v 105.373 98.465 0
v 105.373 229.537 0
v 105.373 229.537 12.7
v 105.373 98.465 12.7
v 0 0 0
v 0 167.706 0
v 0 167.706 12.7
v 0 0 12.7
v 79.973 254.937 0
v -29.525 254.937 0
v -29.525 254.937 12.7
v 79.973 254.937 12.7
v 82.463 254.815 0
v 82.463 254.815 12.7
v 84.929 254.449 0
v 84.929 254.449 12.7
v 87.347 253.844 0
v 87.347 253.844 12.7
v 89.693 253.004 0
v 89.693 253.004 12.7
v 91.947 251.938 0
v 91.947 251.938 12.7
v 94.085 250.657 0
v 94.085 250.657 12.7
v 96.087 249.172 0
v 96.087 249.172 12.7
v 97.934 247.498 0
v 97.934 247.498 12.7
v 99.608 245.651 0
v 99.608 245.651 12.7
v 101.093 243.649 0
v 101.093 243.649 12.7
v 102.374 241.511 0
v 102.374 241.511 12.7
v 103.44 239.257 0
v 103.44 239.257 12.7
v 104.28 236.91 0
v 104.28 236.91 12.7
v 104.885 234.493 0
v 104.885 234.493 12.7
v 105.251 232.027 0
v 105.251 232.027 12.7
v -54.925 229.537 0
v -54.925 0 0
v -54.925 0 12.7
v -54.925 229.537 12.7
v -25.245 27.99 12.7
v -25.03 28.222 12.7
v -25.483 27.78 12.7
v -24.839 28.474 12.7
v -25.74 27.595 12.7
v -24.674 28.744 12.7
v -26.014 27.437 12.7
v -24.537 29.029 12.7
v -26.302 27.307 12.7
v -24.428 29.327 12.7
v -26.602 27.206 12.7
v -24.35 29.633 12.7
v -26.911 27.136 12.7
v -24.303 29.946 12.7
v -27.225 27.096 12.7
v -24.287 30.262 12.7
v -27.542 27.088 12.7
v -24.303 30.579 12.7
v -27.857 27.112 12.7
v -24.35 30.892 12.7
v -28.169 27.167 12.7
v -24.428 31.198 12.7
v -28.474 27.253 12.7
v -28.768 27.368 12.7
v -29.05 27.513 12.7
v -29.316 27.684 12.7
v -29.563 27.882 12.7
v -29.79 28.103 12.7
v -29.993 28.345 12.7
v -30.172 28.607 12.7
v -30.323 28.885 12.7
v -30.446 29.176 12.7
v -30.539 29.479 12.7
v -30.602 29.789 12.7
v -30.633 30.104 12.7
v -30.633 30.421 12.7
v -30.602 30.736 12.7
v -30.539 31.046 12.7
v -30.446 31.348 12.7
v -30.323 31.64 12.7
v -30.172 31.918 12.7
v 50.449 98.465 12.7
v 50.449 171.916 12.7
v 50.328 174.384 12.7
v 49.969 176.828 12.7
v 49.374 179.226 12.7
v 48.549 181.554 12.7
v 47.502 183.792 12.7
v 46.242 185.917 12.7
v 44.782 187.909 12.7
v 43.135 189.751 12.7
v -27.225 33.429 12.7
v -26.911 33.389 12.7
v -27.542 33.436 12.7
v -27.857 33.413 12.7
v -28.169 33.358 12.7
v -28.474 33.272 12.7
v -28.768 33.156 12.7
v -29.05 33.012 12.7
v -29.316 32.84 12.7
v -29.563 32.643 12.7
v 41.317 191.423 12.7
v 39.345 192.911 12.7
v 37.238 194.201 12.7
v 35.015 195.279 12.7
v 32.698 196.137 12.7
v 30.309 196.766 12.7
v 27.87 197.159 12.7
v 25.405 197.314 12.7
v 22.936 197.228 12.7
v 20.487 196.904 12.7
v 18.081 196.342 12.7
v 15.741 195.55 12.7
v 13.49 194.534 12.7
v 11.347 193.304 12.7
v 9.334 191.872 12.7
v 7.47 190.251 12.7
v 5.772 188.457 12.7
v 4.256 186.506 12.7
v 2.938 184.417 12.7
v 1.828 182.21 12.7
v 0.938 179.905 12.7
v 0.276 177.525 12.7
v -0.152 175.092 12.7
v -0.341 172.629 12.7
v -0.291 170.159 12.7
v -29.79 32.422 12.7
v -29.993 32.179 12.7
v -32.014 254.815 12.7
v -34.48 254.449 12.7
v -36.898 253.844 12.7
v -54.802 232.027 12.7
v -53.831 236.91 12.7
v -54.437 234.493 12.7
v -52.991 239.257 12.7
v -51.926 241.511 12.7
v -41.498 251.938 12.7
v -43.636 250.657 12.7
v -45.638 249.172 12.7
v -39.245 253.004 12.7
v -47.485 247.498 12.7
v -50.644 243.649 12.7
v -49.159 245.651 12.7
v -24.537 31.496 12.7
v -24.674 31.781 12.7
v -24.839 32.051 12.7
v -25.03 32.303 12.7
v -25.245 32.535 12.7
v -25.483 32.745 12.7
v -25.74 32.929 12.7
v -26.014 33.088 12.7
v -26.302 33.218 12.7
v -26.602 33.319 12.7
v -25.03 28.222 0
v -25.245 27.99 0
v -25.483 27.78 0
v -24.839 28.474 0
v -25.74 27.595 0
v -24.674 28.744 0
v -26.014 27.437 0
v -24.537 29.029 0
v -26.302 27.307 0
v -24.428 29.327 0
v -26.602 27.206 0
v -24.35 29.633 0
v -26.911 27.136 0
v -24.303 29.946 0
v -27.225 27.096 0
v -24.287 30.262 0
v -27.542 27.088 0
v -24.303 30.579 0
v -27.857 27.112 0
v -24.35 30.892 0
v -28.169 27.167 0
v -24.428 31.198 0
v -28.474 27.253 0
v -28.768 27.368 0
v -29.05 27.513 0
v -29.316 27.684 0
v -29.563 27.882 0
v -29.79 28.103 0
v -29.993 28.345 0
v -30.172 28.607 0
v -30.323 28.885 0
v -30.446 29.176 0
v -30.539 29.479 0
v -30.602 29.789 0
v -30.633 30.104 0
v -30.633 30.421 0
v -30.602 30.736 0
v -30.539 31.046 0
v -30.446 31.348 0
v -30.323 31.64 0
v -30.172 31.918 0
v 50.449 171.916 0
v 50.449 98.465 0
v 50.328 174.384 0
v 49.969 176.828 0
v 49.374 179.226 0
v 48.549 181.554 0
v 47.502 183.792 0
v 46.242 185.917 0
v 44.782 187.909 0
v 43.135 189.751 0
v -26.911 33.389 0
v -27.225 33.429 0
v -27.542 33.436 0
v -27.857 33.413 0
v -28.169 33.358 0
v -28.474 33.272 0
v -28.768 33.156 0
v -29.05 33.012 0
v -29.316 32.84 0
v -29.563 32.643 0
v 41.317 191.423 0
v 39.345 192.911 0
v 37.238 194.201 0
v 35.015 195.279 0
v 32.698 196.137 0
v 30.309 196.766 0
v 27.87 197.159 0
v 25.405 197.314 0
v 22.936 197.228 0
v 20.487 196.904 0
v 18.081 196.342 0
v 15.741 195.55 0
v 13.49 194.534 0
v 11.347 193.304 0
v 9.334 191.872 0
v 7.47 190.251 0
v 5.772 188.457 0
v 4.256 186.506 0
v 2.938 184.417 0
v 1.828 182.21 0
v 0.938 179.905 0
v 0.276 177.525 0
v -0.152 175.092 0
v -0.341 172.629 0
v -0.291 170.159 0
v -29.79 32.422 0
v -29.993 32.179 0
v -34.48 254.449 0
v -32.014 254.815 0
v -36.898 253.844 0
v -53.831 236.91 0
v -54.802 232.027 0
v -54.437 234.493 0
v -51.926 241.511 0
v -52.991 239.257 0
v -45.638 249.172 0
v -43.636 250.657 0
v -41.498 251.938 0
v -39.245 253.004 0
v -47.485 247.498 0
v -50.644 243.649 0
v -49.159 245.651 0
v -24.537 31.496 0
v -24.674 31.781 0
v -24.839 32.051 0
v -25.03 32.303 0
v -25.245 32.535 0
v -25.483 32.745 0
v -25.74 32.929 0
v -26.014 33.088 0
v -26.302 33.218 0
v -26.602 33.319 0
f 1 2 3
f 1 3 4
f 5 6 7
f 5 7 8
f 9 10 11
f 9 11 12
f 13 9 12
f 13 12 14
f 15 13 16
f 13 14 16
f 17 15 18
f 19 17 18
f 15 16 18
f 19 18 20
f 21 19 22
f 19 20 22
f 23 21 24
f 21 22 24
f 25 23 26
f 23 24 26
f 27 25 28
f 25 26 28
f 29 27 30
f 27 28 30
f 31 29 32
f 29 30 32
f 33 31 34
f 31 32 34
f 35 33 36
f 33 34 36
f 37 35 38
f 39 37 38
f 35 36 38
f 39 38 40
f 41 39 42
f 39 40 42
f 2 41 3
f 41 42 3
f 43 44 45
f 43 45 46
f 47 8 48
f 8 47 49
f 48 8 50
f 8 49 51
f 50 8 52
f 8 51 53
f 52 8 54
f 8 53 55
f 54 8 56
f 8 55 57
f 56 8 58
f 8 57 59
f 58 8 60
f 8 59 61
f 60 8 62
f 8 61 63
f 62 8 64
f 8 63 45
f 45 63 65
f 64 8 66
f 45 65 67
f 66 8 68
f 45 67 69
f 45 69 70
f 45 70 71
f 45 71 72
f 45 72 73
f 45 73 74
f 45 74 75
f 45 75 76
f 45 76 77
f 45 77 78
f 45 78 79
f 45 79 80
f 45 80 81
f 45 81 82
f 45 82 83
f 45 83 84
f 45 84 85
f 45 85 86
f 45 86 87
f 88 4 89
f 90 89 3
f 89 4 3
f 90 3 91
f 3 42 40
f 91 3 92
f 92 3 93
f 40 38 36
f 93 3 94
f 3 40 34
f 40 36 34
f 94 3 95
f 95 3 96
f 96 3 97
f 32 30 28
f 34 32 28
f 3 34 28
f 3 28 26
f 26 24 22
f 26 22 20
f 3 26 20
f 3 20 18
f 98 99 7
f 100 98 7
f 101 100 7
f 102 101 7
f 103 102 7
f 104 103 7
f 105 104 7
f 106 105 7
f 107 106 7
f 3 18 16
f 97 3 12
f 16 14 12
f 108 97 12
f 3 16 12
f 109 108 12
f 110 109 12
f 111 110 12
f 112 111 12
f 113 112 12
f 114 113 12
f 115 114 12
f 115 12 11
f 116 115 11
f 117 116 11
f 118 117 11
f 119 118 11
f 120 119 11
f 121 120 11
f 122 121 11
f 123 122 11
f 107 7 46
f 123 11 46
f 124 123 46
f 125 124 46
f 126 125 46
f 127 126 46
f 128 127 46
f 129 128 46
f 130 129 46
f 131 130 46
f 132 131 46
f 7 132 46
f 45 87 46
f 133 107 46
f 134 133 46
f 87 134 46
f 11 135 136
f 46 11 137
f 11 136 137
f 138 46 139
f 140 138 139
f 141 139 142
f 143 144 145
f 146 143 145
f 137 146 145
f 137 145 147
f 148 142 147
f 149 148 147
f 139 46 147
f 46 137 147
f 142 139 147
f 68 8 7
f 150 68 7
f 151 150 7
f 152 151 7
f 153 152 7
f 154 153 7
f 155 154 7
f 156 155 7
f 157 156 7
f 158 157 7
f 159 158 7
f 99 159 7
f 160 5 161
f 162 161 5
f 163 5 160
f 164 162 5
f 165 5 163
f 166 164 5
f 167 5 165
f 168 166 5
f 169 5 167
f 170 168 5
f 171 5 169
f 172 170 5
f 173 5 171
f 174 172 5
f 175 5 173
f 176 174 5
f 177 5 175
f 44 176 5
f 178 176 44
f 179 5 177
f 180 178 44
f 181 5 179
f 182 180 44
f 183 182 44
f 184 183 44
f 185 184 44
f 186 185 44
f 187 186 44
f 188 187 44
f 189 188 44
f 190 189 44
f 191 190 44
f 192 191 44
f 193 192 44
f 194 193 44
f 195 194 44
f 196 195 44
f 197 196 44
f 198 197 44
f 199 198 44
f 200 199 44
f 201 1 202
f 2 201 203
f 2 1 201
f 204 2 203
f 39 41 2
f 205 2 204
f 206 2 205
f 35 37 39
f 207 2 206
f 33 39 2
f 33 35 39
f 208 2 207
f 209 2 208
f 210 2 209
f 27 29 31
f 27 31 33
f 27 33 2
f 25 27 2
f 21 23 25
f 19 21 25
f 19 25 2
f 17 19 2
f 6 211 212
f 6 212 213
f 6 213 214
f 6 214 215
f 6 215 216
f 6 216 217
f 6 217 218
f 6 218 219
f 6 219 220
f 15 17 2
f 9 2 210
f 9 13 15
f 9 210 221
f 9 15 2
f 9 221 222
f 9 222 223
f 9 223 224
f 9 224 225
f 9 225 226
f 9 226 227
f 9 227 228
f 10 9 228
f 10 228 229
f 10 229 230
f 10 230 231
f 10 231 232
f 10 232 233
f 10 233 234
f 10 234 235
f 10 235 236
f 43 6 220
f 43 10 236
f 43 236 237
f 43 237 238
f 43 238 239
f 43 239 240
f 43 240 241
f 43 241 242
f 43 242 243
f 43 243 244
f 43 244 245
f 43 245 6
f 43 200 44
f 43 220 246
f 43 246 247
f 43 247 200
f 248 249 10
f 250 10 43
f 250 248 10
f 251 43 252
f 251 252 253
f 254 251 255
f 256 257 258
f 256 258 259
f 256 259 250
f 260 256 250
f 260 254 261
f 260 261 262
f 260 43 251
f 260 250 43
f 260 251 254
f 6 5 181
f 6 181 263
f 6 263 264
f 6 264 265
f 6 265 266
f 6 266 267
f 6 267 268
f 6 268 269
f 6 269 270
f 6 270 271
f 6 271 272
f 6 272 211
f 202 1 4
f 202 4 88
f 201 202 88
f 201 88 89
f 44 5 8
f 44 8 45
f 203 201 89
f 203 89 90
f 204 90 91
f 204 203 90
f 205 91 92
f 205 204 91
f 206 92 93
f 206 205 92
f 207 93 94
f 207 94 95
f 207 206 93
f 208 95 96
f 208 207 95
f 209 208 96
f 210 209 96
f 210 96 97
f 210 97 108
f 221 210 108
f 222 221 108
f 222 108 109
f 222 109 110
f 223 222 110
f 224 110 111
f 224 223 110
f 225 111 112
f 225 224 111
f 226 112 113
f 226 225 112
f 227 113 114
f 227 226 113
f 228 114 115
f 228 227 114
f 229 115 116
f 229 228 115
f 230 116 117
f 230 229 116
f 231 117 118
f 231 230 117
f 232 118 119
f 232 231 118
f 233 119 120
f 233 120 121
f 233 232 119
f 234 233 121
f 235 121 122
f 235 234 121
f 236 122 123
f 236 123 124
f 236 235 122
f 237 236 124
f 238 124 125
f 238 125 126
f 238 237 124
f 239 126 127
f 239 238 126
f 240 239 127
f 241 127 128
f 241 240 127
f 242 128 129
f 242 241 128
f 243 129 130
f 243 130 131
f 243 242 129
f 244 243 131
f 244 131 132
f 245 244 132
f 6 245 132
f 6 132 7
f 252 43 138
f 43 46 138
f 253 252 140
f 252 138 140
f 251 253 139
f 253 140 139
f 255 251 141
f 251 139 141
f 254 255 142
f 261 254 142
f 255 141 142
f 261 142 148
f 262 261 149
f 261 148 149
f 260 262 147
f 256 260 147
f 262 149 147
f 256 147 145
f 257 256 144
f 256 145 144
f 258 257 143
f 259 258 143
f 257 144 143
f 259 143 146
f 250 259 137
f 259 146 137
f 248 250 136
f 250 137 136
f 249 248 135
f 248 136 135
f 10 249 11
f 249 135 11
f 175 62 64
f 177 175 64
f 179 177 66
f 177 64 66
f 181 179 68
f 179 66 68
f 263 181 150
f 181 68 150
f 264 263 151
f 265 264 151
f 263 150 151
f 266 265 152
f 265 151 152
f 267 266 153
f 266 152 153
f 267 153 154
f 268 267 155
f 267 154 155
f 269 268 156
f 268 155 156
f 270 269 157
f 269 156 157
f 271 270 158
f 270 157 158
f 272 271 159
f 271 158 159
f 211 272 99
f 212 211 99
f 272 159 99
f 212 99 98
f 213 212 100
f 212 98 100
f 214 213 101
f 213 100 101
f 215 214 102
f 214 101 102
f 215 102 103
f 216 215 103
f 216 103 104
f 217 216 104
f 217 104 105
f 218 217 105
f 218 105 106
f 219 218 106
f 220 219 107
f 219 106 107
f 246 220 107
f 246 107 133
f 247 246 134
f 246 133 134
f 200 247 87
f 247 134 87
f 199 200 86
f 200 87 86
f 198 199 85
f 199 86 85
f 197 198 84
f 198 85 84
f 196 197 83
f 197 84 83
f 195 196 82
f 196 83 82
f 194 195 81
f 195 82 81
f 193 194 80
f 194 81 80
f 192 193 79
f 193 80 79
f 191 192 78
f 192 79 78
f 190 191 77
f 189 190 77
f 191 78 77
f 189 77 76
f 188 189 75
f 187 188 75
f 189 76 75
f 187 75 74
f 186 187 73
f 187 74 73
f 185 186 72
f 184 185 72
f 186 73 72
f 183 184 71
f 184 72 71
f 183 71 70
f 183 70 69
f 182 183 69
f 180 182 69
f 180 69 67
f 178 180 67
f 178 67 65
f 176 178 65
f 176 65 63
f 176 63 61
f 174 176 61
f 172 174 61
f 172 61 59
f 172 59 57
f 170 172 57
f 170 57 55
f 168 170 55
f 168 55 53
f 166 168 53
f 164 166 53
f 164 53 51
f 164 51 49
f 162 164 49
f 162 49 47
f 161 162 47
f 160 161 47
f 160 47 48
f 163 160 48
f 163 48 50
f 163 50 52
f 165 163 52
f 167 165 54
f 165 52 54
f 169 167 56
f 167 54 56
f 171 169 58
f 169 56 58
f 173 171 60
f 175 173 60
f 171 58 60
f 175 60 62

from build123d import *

# Parameters (mm, degrees)
BOSS_EXTRUDE2_DEPTH = 12.7
FILLET1_R           = 25.4
FILLET2_R           = 25.4
SKETCH3_R           = 3.175
CUT_EXTRUDE3_DEPTH  = 12.7


with BuildPart() as part:
    # Sketch1 → Boss-Extrude2 (new body)
    with BuildSketch(Plane.XY):
        with BuildLine():
            Line((0, 167.705976621), (0, 0))
            Line((0, 0), (-54.924735551, 0))
            Line((-54.924735551, 0), (-54.924735551, 254.93724428))
            Line((-54.924735551, 254.93724428), (105.37332707, 254.93724428))
            Line((105.37332707, 254.93724428), (105.37332707, 173.075661403))
            Line((105.37332707, 173.075661403), (105.37332707, 98.46451231))
            Line((105.37332707, 98.46451231), (50.448591519, 98.46451231))
            Line((50.448591519, 98.46451231), (50.448591519, 171.91644725))
            ThreePointArc((50.448591519, 171.91644725), (22.936036736, 197.228442673), (0, 167.705976621))
        make_face()
    extrude(amount=BOSS_EXTRUDE2_DEPTH)

    # Fillet1
    fillet1_edges = [part.edges().sort_by_distance(p)[0] for p in [
        (-54.924735551, 254.93724428, 6.35),
    ]]
    fillet(fillet1_edges, radius=FILLET1_R)

    # Fillet2
    fillet2_edges = [part.edges().sort_by_distance(p)[0] for p in [
        (105.37332707, 254.93724428, 6.35),
    ]]
    fillet(fillet2_edges, radius=FILLET2_R)

    # Sketch3 → Cut-Extrude3 (cut)
    with BuildSketch(Plane.XY.offset(12.7)):
        with Locations((-27.462367775, 30.26240116)):
            Circle(SKETCH3_R)
    extrude(amount=-CUT_EXTRUDE3_DEPTH, mode=Mode.SUBTRACT)


solid = part.part
